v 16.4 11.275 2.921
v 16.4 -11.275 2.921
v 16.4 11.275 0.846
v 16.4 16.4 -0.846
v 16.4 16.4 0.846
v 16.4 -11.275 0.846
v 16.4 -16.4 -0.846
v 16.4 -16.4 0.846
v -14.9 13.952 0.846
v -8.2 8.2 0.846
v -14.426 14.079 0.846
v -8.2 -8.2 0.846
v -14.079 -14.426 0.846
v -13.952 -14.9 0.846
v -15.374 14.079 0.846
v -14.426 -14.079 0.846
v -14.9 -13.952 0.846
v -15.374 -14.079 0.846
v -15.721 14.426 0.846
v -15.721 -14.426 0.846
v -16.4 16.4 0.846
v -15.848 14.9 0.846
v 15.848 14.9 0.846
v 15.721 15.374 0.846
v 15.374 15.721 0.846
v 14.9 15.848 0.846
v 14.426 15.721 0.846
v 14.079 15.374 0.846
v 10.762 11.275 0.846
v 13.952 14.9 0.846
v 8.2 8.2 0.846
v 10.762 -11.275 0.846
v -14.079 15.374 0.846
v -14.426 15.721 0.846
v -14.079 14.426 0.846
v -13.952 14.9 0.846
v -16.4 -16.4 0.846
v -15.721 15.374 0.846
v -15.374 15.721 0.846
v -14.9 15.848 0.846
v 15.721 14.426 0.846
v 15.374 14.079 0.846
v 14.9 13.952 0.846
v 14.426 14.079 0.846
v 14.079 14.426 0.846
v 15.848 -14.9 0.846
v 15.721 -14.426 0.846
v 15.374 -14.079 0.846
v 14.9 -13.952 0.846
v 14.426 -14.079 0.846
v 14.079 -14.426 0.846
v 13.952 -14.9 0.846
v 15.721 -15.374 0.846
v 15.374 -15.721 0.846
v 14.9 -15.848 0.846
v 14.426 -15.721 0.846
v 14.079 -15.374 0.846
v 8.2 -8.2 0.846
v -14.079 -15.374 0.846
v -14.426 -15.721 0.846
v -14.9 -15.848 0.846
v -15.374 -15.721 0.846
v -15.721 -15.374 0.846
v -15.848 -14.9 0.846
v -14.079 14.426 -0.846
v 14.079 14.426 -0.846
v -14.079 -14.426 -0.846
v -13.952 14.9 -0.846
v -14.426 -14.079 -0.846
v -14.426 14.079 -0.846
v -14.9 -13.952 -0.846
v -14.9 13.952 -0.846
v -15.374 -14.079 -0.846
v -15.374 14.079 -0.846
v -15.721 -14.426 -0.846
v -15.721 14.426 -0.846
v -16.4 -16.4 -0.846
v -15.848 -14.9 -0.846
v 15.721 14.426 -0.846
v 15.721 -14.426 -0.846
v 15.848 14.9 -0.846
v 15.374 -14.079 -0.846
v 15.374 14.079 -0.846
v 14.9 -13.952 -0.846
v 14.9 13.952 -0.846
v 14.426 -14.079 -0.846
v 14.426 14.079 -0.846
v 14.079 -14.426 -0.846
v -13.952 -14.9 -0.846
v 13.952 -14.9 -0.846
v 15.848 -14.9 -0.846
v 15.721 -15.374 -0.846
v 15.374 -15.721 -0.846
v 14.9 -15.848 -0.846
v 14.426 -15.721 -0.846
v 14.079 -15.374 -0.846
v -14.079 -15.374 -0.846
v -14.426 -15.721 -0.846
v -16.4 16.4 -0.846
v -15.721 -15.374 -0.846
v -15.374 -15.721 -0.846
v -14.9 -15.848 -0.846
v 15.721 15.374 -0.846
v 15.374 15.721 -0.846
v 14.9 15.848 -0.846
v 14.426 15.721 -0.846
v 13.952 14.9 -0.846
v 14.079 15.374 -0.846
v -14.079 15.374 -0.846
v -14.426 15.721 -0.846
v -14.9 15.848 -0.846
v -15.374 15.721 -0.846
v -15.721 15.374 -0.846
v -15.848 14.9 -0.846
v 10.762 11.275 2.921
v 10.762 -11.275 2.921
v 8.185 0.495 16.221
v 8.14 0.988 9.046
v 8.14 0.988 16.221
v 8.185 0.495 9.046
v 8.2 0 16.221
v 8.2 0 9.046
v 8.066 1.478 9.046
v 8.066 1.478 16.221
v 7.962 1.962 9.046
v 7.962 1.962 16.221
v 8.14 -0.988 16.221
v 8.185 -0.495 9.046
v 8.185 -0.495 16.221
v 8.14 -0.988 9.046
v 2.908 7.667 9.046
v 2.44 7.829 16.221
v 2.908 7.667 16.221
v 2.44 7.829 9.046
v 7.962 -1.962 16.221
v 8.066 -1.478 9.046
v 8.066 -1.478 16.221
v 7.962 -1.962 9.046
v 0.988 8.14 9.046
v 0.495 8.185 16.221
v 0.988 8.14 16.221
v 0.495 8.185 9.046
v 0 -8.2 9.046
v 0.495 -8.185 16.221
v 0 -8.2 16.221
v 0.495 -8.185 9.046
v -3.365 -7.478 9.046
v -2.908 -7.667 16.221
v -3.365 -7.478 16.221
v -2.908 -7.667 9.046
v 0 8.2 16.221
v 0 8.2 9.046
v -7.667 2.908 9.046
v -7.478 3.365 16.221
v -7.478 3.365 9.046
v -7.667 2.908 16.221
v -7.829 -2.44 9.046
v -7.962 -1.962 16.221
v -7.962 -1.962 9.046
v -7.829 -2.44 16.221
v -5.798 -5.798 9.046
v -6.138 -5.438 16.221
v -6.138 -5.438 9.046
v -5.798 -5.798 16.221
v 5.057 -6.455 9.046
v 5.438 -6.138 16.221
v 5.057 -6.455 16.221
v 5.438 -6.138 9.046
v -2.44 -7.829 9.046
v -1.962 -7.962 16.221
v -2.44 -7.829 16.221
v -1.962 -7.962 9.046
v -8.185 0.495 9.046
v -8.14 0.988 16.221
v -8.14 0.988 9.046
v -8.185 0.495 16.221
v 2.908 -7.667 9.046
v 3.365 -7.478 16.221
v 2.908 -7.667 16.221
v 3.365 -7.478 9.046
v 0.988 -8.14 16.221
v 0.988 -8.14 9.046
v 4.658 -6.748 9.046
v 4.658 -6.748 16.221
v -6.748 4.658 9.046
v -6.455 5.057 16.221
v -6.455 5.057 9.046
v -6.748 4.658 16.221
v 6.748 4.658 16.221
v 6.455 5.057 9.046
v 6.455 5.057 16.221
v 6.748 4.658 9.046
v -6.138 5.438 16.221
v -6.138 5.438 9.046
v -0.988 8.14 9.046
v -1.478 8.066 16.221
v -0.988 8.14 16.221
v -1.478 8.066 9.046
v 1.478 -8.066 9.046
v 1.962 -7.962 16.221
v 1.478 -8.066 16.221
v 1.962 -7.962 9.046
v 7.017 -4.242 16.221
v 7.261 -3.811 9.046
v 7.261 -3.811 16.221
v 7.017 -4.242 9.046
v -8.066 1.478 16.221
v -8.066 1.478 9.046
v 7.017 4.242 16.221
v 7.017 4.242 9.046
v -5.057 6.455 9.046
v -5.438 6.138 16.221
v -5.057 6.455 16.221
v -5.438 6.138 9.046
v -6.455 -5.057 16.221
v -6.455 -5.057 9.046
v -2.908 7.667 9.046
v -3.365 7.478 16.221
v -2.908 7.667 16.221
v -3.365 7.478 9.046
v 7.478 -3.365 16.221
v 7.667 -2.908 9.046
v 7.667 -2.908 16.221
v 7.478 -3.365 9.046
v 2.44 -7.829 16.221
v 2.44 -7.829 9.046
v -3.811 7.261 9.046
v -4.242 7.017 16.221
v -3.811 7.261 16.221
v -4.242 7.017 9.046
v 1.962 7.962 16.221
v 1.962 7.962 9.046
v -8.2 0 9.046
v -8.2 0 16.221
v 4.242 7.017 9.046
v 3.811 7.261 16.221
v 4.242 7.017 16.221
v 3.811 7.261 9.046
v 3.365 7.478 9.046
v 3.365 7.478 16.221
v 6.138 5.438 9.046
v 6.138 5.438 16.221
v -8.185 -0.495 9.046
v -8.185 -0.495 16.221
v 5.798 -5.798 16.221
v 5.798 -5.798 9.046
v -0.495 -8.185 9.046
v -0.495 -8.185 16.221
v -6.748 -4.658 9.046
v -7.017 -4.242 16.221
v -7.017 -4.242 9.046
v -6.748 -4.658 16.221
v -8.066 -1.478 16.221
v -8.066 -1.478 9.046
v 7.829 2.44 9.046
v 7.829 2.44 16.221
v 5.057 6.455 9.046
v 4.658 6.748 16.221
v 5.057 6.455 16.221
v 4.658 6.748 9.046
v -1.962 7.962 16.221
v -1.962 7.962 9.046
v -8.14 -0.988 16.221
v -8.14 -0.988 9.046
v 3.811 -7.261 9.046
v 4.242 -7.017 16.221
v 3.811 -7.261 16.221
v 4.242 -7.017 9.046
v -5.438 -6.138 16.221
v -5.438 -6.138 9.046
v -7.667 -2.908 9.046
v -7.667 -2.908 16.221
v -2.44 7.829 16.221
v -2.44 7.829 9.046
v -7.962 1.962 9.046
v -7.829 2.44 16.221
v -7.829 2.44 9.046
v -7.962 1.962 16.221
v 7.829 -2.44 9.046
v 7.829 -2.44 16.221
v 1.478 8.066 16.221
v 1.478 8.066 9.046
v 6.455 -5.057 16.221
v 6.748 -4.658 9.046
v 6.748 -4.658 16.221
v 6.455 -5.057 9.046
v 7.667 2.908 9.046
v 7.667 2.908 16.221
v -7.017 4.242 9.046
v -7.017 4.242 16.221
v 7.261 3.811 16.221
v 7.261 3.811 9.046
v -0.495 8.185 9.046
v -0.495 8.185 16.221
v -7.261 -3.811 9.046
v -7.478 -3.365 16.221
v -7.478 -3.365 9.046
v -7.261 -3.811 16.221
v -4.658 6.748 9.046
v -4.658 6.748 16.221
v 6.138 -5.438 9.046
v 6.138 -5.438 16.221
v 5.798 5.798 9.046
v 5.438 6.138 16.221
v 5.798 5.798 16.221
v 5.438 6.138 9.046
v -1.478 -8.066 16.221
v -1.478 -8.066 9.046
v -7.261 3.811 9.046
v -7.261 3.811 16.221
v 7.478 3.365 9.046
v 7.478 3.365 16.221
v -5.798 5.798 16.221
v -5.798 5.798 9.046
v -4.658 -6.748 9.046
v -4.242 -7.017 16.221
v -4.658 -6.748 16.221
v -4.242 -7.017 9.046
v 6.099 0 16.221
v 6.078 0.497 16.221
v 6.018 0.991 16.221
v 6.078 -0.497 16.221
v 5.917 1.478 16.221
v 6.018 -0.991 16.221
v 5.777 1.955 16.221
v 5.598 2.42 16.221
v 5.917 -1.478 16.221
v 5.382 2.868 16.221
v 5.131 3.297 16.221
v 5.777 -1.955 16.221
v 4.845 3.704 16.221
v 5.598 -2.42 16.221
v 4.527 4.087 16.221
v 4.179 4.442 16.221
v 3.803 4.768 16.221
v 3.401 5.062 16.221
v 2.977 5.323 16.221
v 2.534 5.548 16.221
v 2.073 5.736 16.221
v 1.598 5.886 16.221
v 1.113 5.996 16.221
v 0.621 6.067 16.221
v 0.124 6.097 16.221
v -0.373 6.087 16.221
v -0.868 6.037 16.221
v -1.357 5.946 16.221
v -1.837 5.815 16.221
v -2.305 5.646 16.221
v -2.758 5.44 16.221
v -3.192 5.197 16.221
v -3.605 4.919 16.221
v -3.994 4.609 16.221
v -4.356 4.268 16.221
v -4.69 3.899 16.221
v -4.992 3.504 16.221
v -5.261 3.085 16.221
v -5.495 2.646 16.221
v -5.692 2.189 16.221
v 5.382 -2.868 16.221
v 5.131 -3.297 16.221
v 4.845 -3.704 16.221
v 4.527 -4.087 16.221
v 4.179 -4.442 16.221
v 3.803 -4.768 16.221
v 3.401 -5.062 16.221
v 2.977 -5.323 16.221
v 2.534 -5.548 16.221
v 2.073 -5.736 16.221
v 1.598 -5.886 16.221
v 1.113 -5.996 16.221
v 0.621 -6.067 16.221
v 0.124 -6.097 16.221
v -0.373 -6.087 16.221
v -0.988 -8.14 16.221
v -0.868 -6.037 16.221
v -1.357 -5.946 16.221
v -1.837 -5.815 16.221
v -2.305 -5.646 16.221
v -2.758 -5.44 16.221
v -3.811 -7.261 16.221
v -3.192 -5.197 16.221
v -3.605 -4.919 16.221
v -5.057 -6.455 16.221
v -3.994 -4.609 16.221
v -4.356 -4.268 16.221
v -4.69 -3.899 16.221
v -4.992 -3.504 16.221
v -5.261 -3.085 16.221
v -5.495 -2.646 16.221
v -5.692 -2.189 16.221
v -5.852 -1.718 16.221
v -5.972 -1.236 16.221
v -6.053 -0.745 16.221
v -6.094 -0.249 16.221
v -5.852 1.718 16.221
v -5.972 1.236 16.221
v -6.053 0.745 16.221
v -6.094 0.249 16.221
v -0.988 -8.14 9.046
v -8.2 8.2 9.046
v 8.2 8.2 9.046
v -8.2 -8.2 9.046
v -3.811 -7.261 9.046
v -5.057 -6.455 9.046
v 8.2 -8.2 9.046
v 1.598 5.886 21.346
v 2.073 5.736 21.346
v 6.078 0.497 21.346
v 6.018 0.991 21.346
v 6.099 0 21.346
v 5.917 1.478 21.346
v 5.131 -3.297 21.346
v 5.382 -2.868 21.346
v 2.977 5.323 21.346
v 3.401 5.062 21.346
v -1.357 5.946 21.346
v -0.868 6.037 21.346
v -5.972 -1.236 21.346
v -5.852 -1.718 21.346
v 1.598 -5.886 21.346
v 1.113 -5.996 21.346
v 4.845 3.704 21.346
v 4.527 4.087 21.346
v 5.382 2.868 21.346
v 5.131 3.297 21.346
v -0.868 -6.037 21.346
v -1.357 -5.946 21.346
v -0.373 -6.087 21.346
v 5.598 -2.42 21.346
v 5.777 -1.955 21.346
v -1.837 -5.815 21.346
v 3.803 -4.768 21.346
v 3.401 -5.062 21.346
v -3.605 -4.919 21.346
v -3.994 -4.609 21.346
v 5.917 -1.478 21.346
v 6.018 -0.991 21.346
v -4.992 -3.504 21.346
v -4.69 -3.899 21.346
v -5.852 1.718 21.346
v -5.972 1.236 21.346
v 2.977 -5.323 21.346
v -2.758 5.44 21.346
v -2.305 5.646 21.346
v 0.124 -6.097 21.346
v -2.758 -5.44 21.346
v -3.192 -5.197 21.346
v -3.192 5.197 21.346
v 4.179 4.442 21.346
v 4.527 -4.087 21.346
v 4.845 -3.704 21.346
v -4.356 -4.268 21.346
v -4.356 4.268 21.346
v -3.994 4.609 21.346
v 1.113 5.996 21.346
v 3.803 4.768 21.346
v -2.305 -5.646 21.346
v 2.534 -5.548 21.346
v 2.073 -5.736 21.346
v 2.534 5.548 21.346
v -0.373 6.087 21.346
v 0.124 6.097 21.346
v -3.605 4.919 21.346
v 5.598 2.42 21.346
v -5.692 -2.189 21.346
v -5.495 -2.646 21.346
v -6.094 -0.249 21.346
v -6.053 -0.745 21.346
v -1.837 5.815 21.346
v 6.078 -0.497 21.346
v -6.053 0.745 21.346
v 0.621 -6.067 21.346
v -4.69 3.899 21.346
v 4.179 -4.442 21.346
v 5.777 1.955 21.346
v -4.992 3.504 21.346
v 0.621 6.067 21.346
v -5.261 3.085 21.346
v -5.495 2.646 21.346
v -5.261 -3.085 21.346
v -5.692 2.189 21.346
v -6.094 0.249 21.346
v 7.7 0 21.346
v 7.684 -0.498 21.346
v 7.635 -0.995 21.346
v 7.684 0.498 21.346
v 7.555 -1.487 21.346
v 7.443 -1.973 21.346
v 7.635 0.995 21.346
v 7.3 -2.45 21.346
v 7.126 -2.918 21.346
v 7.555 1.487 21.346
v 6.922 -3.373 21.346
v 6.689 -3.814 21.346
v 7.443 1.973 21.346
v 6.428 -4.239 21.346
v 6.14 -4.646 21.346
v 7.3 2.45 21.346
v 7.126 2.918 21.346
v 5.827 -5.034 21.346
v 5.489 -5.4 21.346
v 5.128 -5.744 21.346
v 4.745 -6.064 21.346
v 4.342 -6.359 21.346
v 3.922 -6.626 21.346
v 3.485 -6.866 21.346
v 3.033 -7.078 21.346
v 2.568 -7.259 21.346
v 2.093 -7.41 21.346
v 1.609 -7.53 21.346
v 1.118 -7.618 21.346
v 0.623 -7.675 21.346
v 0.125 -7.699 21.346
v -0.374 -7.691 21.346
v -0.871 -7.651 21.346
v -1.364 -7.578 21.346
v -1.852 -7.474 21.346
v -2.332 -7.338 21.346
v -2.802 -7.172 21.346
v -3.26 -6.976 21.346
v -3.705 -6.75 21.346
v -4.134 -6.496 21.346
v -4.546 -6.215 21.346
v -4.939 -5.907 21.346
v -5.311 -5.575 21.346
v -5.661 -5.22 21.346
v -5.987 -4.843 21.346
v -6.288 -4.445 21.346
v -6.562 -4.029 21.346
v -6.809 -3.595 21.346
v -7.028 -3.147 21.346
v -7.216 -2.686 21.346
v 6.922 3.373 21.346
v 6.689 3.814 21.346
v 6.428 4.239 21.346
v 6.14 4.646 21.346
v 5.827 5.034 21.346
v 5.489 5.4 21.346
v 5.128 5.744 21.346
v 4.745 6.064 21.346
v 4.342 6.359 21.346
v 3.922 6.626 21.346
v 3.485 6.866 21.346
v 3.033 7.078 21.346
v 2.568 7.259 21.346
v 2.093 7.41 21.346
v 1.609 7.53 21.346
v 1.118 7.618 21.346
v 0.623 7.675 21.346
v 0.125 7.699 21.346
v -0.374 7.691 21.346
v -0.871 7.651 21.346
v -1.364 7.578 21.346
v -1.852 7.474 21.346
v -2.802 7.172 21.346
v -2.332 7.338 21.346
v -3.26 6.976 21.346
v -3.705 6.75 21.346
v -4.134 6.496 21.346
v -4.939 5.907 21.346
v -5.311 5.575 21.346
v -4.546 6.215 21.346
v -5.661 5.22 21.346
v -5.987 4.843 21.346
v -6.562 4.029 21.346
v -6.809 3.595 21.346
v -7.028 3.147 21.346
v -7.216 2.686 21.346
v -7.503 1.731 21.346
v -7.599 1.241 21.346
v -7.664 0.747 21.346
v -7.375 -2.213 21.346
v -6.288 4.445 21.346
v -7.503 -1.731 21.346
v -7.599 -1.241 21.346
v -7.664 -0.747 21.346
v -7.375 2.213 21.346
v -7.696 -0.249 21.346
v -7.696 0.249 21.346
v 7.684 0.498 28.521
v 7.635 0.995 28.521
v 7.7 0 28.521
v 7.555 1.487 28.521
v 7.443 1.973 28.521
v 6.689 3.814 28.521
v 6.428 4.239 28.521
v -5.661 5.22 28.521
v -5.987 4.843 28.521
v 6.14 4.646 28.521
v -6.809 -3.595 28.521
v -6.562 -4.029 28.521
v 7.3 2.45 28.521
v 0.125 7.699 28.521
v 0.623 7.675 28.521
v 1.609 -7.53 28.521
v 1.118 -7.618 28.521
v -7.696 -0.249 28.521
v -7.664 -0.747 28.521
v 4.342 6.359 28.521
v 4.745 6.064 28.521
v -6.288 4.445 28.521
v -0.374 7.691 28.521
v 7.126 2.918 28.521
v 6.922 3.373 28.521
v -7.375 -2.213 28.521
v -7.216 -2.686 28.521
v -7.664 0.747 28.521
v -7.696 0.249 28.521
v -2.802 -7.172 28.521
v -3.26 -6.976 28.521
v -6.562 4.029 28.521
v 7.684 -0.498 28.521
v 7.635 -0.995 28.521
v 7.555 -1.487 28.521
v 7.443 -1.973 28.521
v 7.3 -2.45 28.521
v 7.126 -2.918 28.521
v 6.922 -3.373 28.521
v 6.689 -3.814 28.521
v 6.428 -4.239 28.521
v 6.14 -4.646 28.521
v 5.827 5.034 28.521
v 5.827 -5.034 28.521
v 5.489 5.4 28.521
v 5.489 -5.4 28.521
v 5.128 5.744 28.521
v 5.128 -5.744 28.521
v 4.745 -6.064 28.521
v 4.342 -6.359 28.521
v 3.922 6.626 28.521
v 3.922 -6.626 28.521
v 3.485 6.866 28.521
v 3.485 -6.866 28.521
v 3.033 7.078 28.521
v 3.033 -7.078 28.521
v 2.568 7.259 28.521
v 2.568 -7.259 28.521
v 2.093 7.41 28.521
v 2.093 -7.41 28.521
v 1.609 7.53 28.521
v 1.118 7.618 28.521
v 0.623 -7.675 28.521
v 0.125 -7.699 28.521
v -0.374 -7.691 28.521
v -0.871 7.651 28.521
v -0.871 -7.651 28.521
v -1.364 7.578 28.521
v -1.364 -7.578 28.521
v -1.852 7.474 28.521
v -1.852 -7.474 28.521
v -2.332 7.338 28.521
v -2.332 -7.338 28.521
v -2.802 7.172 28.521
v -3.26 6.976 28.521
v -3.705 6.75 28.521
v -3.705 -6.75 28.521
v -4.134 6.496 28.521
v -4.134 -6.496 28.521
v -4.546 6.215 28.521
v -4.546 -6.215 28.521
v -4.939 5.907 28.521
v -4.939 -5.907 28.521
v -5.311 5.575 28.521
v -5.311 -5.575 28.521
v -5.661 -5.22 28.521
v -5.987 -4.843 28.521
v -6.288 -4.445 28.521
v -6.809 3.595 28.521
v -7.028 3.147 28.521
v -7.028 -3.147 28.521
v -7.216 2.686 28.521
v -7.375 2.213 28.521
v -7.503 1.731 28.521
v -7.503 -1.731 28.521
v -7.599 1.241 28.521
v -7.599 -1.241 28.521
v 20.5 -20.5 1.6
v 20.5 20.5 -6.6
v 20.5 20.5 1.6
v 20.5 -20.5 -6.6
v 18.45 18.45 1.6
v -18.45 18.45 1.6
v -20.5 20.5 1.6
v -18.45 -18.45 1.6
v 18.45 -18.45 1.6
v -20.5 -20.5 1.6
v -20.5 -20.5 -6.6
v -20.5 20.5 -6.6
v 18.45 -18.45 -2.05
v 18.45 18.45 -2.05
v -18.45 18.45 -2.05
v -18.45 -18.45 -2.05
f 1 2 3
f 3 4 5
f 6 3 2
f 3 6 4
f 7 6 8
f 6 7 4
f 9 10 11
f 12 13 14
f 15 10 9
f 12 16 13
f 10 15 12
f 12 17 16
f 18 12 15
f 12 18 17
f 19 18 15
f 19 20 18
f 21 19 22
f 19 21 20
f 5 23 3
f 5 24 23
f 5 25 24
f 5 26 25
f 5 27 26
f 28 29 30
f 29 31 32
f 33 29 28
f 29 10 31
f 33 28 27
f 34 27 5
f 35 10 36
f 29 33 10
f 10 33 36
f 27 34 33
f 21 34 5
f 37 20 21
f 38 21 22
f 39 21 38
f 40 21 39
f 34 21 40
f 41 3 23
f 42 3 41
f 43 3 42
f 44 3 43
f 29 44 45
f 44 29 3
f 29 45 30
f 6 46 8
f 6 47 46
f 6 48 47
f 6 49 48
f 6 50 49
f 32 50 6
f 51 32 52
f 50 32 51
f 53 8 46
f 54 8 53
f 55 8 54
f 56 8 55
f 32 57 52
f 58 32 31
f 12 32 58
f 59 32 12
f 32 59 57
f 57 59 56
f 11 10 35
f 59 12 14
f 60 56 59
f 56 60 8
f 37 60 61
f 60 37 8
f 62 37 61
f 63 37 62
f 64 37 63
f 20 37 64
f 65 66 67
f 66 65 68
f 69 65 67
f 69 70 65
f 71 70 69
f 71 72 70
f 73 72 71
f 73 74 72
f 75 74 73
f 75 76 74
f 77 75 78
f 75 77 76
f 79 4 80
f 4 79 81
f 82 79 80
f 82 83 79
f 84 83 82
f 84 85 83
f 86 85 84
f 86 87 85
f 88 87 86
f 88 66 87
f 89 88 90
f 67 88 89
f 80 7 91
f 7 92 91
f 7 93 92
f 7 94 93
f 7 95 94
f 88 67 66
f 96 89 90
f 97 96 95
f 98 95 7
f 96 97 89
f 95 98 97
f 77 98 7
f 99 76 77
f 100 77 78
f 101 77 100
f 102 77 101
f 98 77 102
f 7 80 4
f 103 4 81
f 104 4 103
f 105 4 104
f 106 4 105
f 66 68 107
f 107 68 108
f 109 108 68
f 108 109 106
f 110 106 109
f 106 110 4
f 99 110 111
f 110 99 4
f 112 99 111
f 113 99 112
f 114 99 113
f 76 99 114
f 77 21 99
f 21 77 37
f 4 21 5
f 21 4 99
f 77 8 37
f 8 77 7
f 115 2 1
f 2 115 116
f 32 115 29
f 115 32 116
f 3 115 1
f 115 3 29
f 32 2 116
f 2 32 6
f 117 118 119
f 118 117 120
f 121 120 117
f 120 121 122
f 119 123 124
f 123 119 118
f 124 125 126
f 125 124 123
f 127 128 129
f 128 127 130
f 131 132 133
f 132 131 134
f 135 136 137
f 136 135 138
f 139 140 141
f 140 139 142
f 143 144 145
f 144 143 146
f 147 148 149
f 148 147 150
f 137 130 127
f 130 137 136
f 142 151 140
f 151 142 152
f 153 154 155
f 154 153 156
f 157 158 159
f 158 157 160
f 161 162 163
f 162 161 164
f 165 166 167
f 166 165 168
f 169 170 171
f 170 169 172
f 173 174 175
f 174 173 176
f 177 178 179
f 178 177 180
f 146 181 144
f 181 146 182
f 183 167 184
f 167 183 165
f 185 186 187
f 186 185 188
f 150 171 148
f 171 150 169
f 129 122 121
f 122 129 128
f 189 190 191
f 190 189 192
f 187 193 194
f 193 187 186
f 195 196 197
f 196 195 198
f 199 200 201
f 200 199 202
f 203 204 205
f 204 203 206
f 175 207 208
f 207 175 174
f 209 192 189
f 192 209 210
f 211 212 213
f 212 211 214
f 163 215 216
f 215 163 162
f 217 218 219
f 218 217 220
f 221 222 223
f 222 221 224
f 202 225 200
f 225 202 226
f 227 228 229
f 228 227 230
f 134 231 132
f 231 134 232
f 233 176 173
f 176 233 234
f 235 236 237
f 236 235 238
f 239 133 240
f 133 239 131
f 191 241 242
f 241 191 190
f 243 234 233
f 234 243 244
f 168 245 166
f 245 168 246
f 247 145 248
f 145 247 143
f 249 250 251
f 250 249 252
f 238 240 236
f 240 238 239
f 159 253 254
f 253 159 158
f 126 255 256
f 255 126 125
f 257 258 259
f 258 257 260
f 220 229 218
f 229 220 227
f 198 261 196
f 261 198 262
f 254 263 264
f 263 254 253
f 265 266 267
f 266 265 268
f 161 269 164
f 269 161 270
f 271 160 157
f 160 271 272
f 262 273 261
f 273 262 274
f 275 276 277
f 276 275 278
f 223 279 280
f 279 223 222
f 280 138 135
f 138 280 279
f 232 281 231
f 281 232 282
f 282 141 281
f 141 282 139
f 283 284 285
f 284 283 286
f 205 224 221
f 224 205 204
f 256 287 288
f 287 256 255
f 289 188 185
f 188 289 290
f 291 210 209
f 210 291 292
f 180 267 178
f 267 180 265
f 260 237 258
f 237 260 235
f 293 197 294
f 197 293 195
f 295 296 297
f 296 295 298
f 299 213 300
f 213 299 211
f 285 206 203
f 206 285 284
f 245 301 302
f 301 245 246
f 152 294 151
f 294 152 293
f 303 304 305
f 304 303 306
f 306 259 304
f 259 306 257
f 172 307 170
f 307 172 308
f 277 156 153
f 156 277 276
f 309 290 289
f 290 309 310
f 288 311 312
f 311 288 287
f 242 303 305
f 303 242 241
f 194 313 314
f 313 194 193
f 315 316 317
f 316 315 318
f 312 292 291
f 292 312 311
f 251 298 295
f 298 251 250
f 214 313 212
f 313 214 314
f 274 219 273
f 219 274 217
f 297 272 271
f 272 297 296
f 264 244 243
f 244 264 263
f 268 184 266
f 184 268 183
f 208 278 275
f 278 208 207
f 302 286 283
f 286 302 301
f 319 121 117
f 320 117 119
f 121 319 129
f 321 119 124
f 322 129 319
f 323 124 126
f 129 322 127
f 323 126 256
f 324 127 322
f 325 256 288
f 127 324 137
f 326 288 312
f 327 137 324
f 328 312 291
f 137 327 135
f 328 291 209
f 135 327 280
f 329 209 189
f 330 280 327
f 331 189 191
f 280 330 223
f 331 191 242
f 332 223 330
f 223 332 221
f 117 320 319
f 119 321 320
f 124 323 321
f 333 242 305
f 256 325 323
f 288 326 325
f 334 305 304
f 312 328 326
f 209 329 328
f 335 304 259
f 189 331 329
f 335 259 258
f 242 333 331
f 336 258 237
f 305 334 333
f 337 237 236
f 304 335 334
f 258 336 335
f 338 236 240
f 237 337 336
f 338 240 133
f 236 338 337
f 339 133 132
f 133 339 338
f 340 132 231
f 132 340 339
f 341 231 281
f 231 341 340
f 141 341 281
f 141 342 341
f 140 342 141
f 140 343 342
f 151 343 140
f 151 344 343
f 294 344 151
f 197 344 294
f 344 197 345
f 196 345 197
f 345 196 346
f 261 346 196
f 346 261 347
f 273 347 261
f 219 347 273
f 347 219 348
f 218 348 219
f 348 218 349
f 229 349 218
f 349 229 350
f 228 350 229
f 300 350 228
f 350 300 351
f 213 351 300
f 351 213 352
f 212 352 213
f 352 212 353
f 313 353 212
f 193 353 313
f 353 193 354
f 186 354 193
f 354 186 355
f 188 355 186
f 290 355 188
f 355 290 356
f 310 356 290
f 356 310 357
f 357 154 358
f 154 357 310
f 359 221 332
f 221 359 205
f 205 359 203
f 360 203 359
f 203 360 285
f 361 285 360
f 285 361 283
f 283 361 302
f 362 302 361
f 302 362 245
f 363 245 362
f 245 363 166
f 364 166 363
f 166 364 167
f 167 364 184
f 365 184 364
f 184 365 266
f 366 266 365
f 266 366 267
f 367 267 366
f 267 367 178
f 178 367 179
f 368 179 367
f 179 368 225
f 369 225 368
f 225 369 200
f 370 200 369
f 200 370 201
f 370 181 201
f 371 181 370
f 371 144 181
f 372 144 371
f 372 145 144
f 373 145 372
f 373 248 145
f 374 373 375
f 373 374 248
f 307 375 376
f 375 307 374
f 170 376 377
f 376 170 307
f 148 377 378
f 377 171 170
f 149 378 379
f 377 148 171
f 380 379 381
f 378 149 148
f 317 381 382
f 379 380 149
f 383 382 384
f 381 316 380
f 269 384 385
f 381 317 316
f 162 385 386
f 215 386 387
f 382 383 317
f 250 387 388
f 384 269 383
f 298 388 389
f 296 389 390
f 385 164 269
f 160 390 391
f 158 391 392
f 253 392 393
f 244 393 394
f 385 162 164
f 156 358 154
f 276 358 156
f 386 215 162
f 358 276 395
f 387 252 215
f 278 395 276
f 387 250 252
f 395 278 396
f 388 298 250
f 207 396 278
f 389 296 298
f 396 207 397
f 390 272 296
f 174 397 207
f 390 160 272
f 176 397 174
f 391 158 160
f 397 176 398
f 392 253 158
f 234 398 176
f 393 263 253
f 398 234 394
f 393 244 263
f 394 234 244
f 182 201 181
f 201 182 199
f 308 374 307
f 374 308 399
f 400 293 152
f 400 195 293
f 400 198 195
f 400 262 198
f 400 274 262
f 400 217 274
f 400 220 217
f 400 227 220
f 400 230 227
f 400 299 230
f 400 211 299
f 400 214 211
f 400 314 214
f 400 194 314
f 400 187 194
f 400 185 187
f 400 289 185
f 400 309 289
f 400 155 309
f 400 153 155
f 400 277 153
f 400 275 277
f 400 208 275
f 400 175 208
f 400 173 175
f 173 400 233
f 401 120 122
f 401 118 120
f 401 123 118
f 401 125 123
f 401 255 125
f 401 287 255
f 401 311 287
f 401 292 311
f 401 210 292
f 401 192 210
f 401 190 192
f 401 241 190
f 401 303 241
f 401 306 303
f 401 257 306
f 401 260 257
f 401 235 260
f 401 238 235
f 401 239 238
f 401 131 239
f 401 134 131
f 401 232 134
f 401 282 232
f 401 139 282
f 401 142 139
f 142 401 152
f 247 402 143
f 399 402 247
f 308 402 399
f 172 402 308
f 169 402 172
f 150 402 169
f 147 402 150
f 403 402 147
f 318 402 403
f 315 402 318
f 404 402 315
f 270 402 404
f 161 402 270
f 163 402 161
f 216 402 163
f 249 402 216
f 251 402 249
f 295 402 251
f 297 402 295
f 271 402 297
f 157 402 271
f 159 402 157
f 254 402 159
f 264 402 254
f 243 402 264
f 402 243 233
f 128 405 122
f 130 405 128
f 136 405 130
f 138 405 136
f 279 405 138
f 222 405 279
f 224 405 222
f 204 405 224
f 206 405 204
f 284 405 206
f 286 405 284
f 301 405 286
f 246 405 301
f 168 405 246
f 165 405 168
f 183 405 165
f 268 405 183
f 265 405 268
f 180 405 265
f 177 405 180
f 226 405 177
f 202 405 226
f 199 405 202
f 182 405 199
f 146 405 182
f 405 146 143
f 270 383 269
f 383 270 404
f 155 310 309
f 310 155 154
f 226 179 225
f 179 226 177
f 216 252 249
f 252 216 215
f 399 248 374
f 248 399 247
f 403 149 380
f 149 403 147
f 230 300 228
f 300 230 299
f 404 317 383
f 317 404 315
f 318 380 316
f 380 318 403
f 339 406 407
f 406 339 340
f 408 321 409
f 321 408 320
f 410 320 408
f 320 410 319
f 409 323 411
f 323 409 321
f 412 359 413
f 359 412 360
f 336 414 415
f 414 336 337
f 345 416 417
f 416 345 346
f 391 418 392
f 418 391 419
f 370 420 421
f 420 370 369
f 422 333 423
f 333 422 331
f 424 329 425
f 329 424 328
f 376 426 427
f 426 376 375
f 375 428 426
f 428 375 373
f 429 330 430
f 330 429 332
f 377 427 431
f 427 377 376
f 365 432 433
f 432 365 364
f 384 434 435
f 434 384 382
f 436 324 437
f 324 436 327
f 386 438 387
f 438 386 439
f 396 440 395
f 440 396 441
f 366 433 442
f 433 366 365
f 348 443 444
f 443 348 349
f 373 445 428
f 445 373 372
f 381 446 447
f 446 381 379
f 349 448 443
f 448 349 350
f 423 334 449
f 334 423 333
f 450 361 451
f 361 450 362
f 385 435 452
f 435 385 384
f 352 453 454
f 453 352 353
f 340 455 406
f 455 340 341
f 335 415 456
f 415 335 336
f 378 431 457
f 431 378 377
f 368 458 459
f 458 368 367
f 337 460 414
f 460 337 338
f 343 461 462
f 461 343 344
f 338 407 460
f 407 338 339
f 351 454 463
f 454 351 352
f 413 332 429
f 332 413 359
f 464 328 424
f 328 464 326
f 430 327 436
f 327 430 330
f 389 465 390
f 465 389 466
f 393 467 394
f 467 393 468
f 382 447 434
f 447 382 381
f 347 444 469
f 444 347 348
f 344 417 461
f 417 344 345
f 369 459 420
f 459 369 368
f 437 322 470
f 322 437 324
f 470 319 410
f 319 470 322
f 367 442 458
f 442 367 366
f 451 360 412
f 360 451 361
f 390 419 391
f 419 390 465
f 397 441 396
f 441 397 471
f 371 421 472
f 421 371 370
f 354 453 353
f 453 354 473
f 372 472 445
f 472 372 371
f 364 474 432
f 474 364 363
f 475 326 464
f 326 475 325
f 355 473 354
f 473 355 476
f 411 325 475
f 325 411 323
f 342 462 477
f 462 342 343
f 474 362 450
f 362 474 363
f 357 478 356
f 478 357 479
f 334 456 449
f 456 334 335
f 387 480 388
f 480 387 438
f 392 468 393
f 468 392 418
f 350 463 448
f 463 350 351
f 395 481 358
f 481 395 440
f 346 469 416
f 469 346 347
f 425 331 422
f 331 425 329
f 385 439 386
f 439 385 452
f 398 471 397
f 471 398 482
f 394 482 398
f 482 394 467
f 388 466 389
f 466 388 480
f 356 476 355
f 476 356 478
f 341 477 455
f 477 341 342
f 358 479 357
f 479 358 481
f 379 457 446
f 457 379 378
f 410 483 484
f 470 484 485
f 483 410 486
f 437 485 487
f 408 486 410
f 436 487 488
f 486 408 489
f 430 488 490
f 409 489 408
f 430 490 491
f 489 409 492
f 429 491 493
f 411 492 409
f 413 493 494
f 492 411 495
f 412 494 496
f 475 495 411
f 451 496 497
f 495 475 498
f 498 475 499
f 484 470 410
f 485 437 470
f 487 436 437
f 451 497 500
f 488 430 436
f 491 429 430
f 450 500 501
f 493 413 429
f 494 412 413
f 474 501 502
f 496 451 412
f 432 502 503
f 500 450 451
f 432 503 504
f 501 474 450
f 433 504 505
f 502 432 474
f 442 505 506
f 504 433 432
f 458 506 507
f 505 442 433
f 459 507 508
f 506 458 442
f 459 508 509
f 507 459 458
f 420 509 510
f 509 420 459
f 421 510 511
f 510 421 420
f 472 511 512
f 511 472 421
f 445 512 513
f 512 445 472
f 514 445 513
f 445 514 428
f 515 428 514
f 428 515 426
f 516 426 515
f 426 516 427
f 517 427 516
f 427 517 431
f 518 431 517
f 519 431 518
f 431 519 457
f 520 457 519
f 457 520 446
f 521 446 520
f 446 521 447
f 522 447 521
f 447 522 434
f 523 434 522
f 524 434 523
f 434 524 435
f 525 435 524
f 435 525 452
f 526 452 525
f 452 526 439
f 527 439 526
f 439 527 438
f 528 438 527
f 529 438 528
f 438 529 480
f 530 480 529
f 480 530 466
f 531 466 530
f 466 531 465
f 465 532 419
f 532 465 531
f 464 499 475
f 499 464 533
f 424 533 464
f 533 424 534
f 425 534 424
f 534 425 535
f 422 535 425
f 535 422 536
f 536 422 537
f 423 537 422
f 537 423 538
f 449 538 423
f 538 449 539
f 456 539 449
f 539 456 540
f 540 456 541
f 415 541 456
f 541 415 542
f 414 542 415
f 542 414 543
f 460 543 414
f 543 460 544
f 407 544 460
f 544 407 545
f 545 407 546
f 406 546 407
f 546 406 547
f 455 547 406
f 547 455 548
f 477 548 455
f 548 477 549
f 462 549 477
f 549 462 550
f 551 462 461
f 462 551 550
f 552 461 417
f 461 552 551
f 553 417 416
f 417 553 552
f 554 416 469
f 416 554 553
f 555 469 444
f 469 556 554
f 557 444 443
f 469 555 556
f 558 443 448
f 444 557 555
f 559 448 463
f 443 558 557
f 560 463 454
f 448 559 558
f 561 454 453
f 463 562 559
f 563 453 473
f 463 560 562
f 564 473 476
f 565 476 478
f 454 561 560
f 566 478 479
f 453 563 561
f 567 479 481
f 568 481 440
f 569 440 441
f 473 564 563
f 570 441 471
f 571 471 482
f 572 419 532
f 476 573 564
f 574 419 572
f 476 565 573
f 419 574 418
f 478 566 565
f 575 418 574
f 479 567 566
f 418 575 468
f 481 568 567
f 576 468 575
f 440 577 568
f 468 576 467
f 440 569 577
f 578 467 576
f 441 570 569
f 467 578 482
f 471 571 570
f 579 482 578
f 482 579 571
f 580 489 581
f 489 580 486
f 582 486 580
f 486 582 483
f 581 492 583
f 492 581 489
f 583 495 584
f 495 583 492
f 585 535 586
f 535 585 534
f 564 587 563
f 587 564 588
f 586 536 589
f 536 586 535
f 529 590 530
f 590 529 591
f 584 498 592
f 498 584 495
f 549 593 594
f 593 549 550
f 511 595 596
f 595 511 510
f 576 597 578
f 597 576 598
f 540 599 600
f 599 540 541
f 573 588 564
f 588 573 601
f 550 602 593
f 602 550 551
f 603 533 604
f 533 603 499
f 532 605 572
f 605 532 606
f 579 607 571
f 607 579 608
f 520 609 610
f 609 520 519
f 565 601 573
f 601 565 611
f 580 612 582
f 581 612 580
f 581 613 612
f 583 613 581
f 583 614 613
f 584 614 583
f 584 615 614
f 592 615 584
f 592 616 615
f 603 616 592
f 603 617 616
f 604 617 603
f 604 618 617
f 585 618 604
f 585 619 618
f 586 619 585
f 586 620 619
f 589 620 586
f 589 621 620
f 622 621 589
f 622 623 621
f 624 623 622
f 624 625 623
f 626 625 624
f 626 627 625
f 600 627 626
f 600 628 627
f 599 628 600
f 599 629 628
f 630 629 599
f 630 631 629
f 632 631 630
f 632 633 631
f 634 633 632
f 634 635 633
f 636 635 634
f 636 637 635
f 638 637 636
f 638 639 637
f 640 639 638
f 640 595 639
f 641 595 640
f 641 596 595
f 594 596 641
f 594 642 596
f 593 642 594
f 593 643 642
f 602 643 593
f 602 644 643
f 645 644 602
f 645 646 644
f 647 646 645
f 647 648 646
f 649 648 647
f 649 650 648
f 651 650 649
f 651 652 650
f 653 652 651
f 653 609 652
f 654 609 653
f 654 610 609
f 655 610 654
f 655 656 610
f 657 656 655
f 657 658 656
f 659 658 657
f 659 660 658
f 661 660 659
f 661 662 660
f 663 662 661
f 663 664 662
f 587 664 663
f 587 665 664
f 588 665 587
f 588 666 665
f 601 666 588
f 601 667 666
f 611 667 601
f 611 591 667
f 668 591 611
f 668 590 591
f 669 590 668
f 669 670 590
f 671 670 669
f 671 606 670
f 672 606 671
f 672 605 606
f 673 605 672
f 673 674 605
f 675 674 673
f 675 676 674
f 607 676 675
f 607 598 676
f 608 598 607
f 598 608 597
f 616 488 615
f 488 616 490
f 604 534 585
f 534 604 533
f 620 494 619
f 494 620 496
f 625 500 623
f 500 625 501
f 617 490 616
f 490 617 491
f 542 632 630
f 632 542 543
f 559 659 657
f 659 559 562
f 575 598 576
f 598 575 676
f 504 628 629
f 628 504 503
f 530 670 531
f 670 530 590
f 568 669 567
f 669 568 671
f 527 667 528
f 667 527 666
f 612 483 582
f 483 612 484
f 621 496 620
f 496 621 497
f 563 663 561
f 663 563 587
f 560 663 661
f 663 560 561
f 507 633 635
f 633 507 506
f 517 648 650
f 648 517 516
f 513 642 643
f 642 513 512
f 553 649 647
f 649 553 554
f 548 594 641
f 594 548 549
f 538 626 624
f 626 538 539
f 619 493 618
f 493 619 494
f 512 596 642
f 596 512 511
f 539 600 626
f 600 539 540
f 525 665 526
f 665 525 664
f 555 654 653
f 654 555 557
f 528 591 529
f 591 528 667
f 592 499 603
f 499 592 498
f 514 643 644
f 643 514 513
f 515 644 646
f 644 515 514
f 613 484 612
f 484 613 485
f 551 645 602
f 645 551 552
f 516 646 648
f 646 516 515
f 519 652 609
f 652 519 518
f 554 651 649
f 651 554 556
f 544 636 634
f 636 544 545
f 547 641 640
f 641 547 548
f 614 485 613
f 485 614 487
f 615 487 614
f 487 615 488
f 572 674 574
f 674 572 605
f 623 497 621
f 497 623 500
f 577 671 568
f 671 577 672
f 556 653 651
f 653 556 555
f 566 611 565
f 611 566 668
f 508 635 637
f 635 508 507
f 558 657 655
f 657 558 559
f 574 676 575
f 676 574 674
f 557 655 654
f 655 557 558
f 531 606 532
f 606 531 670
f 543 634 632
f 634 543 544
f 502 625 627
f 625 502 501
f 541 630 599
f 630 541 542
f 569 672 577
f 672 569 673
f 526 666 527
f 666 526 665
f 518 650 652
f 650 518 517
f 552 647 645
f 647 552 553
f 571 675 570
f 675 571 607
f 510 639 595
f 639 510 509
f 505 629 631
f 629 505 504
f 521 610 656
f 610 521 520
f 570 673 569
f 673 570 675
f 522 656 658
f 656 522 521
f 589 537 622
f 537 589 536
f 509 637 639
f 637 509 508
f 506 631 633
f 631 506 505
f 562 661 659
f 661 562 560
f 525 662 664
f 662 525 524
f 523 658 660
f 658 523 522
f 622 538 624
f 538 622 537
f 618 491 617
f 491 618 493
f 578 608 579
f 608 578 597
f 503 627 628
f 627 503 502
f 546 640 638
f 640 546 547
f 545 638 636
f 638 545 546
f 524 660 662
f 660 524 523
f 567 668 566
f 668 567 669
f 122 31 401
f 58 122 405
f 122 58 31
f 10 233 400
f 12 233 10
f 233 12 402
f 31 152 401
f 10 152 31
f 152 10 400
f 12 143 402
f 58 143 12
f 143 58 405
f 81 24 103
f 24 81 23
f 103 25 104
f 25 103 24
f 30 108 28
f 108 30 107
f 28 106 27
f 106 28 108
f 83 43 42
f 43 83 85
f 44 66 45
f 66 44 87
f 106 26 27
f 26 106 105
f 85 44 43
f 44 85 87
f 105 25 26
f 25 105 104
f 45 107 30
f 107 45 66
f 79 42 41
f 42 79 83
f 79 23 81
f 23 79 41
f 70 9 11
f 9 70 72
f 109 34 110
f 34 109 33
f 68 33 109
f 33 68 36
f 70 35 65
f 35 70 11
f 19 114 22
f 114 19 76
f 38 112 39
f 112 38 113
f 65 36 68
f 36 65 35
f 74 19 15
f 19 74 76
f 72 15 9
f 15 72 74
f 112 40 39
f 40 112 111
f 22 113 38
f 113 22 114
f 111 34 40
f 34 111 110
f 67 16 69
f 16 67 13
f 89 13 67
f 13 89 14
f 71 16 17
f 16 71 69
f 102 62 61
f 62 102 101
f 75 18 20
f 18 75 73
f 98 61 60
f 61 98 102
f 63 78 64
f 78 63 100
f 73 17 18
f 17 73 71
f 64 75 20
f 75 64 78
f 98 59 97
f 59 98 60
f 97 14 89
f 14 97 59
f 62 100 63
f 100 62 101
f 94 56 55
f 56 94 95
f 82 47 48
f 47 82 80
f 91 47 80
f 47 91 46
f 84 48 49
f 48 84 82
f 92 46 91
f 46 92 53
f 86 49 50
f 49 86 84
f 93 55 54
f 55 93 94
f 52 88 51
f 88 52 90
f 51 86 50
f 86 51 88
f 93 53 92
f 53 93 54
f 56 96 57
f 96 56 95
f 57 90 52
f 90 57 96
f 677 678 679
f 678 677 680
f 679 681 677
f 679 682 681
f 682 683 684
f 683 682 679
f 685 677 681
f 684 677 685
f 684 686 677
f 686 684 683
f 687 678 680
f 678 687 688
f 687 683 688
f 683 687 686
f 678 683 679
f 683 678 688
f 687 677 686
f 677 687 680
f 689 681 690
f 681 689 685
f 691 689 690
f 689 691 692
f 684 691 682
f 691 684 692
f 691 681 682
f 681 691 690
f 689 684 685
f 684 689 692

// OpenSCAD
// file: CameraRPI.scad
////////////////////////// VARIAVEIS ////////////////////////////////

$fa = 1.5;
$fs = 0.5;

FC = 1;

// Placa de circuito impresso
cameraCircuitoLar = 32 * FC ;
cameraCircuitoProfun = 32 * FC ;
cameraCircuitoAlt = 1.65 * FC ;


// Base da Lente
cameraBasevLar = 16 * FC ;
cameraBaseProfun = 16 * FC ;
cameraBaseAlt = 8 * FC ;

// Lente
cameraLenteLar = 16 * FC ;
cameraLenteAlt = 7 * FC ;

//Lente Foco
cameraLenteFocoLar = 11.90 * FC ;
cameraLenteFocoAlt = 5 * FC ;

// Base da Lente
cameraConecLar = 22 * FC ;
cameraConecProfun = 5.5 * FC ;
cameraConecAlt = 2.4 * FC ;

//Furos
cameraCircuitoFuroLar = 1.85 * FC ;

////////////////////////// MODULOS ////////////////////////////////
module placaCCD(){
        // Placa de circuito impresso
    color ("darkgreen"){ 
        cube( [cameraCircuitoProfun, cameraCircuitoLar, cameraCircuitoAlt] , center = true);
    }    // Conector odo flat cable da camera
    color ("white"){
        translate([ ( cameraCircuitoProfun / 2 ) - ( cameraConecProfun / 2 )  , 0 , cameraCircuitoAlt ]){
            cube([cameraConecProfun, cameraConecLar, cameraConecAlt] , center = true );
        }
    }
}



module CCD(){
    translate ( [ -cameraBasevLar / 2 , -cameraBaseProfun / 2 , cameraCircuitoAlt / 2 ] ){ 
        color ("gray")
        cube([cameraBasevLar, cameraBaseProfun, cameraBaseAlt]);
    }
}


module jogoLentes( stl ){
   translate([ 0 , 0 , ( cameraCircuitoAlt / 2 ) + cameraBaseAlt ]){
       color ("gray")
       cylinder( r = cameraLenteLar / 2 , h = cameraLenteAlt );
    }
    translate([ 0 , 0 , ( cameraCircuitoAlt / 2 ) + cameraBaseAlt + cameraLenteAlt]){
        color("gray")
        cylinder( r = cameraLenteFocoLar / 2 , h = cameraLenteFocoAlt );
    }
    translate([ 0 , 0 , ( cameraCircuitoAlt / 2 ) + cameraBaseAlt+ cameraLenteAlt + cameraLenteFocoAlt ]){
       color ("gray")
        if ( stl == "true" ){
            cylinder( r = cameraLenteFocoLar / 2 , h = cameraLenteAlt );
        } else {
            cylinder( r = cameraLenteLar / 2 - 0.5 , h = cameraLenteAlt );
        }
    }    
}


module parafusoBase(){
            // Furos da placa para os parafusos 1
            translate([ ( cameraCircuitoProfun / 2 ) - 1.5 , ( cameraCircuitoLar / 2 ) - 1.5, 0 ]){
               #cylinder( r =  cameraCircuitoFuroLar / 2 , h = cameraCircuitoAlt + 0.25 , center = true);
            }
            // Furos da placa para os parafusos 2
            translate([ ( - cameraCircuitoProfun / 2 ) + 1.5 , ( cameraCircuitoLar / 2 ) - 1.5, 0 ]){
               #cylinder( r =  cameraCircuitoFuroLar / 2 , h = cameraCircuitoAlt + 0.25 , center = true);
            }
            // Furos da placa para os parafusos 3
            translate([ ( - cameraCircuitoProfun / 2 ) + 1.5 , ( - cameraCircuitoLar / 2 ) + 1.5, 0 ]){
               #cylinder( r =  cameraCircuitoFuroLar / 2 , h = cameraCircuitoAlt + 0.25 , center = true);
            }
            // Furos da placa para os parafusos 4
            translate([ ( cameraCircuitoProfun / 2 ) - 1.5 , ( - cameraCircuitoLar / 2 ) + 1.5, 0 ]){
               #cylinder( r =  cameraCircuitoFuroLar / 2 , h = cameraCircuitoAlt + 0.25 , center = true);
            }    
}


module camera( stl ){
    difference(){    
        union(){
            // Placa de circuito impresso
            placaCCD(); 
            // CCD
            CCD();
            // JOGO DE LENTES
            jogoLentes( stl);
        }
            // Retirando os furos para os parafusos
            parafusoBase();
    }
}

////////////////////////// REDERIZACAO ////////////////////////////////
//camera( "true" );
// main file
////////////////////  VARIAVEIS //////////////////////////
include <CameraRPI.scad>;

$fa = 1.5;
$fs = 0.5;

FC = 1.025;

/// BASE DA CANERA
baseCameraProfun = 40 * FC ;
baseCameraLar = 40 * FC ;
baseCameraAlt = 4 * FC ;
baseCameraEspessura = 4 * FC ;

////////////////////  MODULOS //////////////////////////
module baseCamera(){

    difference(){
        //Bloco maior
        translate ([ 0 , 0 , -2.5 ]){
            cube([baseCameraProfun,baseCameraLar,baseCameraAlt * 2] , center = true );
        }
        //Bloco menor (cavidade)
        translate ([ 0 , 0 , 0 ]){
            cube([baseCameraProfun - baseCameraEspessura,baseCameraLar - baseCameraEspessura,baseCameraAlt] , center = true );   
         }
    }
}

module suporteCamera(){
    baseCamera();
}


////////////////////  RENDERIZACAO //////////////////////////


camera();
suporteCamera();
